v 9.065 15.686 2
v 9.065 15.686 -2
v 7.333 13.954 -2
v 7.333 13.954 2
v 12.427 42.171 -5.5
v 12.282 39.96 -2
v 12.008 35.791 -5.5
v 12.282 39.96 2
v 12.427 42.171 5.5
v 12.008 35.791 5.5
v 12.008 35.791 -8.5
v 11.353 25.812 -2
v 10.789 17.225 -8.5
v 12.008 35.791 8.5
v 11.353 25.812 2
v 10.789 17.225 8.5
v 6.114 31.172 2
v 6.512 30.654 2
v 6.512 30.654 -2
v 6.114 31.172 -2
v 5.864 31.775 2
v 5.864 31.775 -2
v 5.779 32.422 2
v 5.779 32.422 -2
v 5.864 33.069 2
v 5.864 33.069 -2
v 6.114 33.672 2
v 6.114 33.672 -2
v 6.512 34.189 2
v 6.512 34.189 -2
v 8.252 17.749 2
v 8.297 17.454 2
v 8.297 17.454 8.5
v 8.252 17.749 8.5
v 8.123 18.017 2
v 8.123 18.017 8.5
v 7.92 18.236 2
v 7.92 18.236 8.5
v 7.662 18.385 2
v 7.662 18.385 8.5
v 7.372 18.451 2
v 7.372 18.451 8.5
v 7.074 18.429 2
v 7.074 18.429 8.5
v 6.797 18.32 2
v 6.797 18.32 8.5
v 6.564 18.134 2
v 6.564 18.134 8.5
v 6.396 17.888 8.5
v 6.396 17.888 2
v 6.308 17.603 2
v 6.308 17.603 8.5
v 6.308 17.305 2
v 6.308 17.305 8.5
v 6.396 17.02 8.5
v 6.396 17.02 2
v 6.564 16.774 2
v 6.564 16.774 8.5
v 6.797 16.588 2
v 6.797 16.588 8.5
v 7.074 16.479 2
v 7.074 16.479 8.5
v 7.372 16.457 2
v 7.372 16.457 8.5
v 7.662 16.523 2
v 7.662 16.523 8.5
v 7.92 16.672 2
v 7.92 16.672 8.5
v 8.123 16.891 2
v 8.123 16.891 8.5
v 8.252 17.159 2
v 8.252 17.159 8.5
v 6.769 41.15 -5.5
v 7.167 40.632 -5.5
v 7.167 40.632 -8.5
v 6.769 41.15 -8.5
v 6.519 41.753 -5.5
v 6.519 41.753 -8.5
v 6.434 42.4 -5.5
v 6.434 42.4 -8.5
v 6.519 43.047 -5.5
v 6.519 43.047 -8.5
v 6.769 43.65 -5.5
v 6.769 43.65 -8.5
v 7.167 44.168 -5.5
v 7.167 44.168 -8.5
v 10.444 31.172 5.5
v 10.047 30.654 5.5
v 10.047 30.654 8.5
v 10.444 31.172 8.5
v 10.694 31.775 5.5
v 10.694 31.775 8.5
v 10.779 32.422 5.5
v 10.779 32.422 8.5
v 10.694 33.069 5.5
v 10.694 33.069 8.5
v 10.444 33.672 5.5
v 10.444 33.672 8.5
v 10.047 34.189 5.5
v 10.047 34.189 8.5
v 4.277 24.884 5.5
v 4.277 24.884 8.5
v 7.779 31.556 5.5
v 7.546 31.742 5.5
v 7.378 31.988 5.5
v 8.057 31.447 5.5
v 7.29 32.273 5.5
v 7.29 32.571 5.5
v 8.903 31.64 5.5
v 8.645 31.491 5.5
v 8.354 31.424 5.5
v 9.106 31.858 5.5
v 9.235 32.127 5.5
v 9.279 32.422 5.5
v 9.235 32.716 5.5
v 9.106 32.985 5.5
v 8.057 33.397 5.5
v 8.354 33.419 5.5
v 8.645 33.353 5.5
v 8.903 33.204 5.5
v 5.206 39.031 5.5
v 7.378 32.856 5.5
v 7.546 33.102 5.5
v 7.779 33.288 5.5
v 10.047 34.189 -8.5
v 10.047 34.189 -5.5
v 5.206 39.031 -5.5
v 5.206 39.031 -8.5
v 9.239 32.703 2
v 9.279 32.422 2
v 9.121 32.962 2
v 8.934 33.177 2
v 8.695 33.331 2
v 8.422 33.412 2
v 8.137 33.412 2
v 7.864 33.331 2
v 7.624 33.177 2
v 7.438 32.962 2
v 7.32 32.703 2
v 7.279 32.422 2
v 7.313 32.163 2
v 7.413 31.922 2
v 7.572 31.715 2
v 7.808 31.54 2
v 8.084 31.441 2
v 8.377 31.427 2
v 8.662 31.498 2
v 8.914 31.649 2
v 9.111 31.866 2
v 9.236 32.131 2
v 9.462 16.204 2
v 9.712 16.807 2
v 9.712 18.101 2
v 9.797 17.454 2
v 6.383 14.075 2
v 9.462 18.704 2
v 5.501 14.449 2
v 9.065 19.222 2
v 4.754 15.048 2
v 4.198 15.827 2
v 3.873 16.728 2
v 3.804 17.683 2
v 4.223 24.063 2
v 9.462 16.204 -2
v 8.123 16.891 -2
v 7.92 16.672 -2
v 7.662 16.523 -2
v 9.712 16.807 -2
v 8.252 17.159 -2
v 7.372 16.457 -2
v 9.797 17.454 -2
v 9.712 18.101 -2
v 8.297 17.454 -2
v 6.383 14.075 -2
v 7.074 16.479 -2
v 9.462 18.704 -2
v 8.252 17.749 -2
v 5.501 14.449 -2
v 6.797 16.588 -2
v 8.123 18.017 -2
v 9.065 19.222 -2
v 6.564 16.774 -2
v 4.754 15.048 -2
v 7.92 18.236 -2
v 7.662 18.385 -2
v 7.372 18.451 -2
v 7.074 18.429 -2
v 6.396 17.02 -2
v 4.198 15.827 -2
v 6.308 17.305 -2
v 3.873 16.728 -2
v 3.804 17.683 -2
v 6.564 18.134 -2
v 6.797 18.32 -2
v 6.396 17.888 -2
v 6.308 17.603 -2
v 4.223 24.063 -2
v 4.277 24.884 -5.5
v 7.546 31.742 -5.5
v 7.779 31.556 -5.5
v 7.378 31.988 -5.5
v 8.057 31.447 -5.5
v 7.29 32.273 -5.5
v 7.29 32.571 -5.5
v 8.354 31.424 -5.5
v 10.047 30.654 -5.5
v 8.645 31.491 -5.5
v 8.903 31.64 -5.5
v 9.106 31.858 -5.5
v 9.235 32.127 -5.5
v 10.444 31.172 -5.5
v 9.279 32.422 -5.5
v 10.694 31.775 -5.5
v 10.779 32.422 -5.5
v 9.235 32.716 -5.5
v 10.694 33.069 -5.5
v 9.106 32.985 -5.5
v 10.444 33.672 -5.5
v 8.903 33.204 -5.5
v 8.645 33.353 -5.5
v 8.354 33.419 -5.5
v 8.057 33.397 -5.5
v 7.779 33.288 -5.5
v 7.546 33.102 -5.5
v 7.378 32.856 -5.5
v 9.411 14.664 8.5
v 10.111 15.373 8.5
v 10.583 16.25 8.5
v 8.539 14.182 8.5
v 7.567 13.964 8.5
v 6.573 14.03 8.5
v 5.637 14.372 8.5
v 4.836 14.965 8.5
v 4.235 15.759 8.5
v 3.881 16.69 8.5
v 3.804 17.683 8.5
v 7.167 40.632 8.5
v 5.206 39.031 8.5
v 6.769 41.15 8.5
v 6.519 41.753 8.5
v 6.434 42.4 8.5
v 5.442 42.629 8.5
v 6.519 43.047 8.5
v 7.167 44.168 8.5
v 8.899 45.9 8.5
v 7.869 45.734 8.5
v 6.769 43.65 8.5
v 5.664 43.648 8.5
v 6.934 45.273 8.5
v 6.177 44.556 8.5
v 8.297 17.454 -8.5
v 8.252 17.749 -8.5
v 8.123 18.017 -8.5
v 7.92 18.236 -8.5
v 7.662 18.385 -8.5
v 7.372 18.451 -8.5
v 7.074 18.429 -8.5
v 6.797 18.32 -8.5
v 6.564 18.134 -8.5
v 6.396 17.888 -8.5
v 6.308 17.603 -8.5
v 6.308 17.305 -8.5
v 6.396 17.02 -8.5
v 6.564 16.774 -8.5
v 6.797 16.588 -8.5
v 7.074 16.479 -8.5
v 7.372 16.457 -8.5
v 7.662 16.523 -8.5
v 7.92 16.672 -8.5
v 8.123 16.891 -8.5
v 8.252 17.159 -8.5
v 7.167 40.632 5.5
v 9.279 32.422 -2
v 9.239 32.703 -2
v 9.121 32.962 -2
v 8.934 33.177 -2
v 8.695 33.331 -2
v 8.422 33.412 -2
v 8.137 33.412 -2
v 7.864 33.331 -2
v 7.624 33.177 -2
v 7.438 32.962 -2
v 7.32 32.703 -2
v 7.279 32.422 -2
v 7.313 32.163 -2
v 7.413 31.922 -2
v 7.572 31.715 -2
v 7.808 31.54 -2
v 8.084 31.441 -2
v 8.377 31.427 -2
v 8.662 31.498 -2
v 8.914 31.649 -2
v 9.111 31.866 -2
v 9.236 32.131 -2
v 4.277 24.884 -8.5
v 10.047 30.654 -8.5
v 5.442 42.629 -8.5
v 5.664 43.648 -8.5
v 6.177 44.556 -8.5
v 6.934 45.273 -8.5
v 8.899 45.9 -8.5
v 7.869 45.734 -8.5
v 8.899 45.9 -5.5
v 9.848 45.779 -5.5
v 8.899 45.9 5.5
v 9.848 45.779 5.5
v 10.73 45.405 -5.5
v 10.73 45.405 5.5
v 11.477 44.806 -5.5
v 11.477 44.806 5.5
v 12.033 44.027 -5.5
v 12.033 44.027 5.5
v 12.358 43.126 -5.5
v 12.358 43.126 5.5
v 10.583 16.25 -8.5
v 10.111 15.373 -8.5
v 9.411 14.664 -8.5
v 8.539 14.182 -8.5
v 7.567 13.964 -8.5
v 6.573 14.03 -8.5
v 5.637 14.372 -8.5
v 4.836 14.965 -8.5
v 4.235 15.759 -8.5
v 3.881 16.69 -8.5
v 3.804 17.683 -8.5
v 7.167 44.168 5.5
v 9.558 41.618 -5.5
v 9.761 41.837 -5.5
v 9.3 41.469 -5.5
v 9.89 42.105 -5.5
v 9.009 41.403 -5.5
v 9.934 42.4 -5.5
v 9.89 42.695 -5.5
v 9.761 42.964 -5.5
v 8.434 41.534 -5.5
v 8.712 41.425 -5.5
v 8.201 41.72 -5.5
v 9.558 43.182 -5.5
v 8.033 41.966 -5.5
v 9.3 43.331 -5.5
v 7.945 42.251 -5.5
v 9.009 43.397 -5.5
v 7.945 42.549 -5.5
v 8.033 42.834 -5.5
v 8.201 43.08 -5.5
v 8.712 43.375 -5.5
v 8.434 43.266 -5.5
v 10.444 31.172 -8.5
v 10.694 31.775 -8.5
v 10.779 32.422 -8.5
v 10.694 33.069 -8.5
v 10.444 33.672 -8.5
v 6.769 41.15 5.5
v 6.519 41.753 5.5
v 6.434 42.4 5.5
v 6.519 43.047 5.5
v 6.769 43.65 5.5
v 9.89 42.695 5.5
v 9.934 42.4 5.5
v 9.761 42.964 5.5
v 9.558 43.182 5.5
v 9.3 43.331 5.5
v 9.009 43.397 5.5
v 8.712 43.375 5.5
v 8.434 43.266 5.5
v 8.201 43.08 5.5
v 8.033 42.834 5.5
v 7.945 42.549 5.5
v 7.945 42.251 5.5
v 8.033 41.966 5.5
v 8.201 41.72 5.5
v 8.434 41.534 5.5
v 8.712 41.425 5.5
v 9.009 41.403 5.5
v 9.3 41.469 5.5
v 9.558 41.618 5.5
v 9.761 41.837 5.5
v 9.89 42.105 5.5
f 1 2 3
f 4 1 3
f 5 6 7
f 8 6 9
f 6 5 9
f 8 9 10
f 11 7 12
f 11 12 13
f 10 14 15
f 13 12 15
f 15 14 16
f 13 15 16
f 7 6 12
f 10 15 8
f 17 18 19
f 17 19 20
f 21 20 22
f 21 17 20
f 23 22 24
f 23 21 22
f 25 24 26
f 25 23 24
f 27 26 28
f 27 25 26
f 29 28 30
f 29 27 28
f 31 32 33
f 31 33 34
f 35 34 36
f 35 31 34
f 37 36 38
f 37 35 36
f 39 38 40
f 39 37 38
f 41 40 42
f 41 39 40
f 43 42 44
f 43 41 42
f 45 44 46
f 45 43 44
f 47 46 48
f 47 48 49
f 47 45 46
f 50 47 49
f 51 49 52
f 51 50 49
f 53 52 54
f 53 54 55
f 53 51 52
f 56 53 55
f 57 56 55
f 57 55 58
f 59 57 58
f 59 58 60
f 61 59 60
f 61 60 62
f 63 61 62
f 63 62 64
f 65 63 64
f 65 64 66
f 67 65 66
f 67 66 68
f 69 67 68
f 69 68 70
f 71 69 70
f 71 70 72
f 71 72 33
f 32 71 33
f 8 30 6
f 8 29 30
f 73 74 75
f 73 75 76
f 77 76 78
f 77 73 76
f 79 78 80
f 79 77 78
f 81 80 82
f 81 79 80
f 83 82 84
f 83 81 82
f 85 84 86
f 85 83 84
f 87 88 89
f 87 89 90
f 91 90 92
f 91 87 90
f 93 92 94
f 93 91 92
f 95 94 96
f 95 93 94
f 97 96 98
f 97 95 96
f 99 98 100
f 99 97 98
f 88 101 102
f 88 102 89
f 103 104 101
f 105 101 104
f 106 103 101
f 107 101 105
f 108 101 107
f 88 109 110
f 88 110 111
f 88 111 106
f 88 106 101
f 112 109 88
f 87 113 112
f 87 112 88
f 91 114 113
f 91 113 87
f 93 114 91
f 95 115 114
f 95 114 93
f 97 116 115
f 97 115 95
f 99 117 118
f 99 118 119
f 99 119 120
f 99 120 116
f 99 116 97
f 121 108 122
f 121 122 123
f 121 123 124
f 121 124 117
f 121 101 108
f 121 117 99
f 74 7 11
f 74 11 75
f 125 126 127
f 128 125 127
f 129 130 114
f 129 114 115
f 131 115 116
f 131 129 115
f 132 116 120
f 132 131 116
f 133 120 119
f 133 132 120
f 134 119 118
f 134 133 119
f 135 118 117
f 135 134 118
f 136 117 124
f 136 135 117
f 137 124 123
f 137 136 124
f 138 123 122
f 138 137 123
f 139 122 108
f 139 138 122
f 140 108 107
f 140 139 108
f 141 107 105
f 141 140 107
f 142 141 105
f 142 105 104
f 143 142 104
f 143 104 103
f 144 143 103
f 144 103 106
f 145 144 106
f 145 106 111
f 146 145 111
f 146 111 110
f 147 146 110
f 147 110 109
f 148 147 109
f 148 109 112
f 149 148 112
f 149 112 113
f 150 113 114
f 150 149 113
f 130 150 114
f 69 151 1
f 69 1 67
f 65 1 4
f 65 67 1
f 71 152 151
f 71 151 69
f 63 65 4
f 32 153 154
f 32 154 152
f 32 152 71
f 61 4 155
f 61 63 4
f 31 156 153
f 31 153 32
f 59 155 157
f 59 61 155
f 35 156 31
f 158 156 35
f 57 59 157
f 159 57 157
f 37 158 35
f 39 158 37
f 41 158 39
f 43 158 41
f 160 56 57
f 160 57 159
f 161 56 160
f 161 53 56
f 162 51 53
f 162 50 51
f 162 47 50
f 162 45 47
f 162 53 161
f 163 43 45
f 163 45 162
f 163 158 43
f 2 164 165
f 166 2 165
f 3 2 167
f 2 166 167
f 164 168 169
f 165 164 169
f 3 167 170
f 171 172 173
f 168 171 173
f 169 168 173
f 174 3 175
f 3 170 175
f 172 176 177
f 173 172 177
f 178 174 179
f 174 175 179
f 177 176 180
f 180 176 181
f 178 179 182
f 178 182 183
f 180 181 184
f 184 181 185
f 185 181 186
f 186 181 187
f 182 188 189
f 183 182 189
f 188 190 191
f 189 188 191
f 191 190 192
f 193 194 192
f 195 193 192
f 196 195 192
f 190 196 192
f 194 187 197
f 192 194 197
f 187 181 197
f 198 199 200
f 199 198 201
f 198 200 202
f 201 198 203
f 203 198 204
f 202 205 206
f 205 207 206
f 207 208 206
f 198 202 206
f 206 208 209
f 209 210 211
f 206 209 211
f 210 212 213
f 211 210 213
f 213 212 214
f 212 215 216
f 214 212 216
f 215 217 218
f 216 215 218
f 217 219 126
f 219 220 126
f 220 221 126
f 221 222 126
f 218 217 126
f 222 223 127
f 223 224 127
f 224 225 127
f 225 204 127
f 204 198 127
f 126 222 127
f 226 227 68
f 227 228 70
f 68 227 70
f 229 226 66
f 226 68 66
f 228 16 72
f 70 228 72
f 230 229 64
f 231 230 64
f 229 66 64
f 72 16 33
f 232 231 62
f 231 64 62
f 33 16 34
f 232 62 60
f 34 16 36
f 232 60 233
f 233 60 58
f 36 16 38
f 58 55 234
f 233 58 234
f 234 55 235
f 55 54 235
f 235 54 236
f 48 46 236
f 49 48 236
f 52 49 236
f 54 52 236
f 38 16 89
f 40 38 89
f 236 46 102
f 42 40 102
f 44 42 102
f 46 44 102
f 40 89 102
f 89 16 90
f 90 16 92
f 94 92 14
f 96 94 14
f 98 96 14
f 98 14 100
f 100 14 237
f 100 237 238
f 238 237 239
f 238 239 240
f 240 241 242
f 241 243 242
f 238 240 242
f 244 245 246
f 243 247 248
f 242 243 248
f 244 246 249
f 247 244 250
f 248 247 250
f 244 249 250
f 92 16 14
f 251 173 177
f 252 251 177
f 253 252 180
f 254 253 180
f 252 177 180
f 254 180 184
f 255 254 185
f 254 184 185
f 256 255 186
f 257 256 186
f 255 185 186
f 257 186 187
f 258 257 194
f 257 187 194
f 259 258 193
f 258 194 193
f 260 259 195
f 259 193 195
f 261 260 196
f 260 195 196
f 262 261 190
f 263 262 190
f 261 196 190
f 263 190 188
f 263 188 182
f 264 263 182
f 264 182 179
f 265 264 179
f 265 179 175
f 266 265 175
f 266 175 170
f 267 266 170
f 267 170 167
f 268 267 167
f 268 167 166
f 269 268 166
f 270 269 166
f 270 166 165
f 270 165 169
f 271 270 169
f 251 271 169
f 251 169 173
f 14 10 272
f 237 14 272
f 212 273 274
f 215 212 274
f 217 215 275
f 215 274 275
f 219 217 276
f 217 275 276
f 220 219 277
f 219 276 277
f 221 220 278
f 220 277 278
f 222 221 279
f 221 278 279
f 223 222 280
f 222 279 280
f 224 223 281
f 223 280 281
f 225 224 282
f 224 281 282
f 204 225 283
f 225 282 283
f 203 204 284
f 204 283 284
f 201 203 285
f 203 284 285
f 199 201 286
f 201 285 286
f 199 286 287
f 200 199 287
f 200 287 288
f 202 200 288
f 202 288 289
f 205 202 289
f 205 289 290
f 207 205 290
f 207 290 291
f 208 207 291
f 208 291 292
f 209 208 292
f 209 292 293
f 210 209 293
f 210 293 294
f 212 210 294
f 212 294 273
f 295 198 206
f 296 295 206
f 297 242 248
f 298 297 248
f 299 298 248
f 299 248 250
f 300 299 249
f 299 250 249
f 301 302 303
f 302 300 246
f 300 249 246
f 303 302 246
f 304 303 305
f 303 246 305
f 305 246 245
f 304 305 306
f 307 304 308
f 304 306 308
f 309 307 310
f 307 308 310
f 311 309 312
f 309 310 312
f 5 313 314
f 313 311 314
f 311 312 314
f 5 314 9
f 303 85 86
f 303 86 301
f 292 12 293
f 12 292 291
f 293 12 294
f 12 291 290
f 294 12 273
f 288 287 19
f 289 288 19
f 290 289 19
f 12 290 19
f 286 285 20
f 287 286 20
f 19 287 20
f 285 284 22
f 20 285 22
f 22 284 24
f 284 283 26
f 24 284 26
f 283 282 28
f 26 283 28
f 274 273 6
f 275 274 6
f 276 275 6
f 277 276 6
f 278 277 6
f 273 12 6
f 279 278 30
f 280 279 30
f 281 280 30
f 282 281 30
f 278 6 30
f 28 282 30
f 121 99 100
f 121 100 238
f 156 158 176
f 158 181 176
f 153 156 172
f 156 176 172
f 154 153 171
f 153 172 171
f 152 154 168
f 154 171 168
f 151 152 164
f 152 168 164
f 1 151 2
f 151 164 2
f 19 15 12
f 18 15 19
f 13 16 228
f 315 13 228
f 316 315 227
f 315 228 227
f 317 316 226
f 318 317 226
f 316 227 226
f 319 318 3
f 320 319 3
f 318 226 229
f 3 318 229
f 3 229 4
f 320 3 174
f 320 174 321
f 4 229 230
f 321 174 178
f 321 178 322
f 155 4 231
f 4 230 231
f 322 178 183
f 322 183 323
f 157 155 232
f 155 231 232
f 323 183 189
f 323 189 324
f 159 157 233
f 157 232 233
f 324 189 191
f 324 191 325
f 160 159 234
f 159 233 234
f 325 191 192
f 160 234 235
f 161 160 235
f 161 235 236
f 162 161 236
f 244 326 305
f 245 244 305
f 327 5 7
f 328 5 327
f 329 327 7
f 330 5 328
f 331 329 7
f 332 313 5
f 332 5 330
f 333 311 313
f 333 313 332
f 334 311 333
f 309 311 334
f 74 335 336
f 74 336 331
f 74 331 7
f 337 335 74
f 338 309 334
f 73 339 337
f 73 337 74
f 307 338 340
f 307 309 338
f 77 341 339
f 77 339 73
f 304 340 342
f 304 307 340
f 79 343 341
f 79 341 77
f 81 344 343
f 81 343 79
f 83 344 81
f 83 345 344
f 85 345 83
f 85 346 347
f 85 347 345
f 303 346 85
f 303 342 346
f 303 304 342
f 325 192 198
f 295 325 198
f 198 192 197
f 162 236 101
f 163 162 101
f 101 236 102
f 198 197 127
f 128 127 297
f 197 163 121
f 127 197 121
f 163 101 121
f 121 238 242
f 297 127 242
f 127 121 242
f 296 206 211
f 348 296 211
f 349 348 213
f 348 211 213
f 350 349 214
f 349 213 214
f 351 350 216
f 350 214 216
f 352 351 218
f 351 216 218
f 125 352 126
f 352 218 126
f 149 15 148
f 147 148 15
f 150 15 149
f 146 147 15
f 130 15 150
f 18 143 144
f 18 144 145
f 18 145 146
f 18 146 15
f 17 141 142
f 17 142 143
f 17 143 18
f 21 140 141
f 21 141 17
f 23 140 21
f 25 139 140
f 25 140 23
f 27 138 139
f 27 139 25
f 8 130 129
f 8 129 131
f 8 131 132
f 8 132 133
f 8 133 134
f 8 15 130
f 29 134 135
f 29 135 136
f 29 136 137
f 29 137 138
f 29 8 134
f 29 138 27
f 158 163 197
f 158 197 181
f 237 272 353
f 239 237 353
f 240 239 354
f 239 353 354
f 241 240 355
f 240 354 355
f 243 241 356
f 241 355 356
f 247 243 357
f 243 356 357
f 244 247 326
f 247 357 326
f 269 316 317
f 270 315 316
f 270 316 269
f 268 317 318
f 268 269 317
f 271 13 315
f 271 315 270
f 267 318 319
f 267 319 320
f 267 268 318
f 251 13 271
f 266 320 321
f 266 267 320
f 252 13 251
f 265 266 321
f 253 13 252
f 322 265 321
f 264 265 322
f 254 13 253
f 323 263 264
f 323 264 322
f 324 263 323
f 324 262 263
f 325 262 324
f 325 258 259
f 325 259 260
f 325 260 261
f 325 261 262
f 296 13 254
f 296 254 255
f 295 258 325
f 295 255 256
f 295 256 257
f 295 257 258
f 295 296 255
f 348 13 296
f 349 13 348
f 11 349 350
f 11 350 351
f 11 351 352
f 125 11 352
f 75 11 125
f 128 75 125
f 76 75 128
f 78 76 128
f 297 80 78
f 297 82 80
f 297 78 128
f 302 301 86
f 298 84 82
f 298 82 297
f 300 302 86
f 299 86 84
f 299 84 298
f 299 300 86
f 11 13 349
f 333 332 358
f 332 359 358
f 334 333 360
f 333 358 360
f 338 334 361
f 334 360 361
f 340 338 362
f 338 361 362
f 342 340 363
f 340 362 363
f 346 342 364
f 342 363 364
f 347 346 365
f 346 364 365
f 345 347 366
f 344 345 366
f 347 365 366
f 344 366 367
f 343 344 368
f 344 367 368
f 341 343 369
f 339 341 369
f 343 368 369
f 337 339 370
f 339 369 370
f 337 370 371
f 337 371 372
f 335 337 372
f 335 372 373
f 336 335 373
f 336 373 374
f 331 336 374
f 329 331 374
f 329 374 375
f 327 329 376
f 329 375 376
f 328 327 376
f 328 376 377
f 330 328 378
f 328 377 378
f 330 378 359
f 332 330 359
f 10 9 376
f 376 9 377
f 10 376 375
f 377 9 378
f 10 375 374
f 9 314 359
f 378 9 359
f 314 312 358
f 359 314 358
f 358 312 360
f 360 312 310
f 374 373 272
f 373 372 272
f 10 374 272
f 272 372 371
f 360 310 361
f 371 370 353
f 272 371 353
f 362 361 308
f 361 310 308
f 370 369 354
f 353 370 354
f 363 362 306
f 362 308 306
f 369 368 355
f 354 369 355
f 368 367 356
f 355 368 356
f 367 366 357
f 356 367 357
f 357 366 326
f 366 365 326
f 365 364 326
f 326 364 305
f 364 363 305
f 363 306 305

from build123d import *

# Parameters (mm, degrees)
SKETCH1_R           = 1
BOSS_EXTRUDE1_DEPTH = 8.5
CUT_EXTRUDE1_DEPTH  = 2
CUT_EXTRUDE2_START  = -3
CUT_EXTRUDE2_DEPTH  = 3


with BuildPart() as part:
    # Sketch1 → Boss-Extrude1 (new body)
    with BuildSketch(Plane.XY):
        with BuildLine():
            Line((12.42679356, 42.170979879), (10.789298219, 17.224665341))
            ThreePointArc((10.789298219, 17.224665341), (7.067564836, 13.961430653), (3.804330148, 17.683164036))
            Line((3.804330148, 17.683164036), (5.441825489, 42.629478574))
            ThreePointArc((5.441825489, 42.629478574), (9.163558872, 45.892713262), (12.42679356, 42.170979879))
        make_face()
        with Locations((7.296814184, 17.453914689)):
            Circle(SKETCH1_R, mode=Mode.SUBTRACT)
        with Locations((8.279311388, 32.421703411)):
            Circle(SKETCH1_R, mode=Mode.SUBTRACT)
        with Locations((8.934309525, 42.400229226)):
            Circle(SKETCH1_R, mode=Mode.SUBTRACT)
    boss_extrude1 = extrude(amount=BOSS_EXTRUDE1_DEPTH)

    # Sketch2 → Cut-Extrude1 (cut)
    # profile 1 of 2: a face of its own
    with BuildSketch(Plane(origin=(0, 0, 0), x_dir=(-1, 0, 0), z_dir=(0, 0, -1))):
        with BuildLine():
            ThreePointArc((-6.511544435, 30.653936458), (-5.779311388, 32.421703411), (-6.511544435, 34.189470364))
            Line((-6.511544435, 34.189470364), (-12.281634265, 39.959560194))
            Line((-12.281634265, 39.959560194), (-11.353008502, 25.812472391))
            Line((-11.353008502, 25.812472391), (-6.511544435, 30.653936458))
        make_face()
        with BuildLine():
            ThreePointArc((-7.279311388, 32.421703411), (-7.355431856, 32.039019979), (-7.572204607, 31.71459663))
            ThreePointArc((-7.572204607, 31.71459663), (-9.203190921, 32.804386844), (-7.279311388, 32.421703411))
        make_face(mode=Mode.SUBTRACT)
    # profile 2 of 2: a face of its own
    with BuildSketch(Plane(origin=(0, 0, 0), x_dir=(-1, 0, 0), z_dir=(0, 0, -1))):
        with BuildLine():
            ThreePointArc((-9.064581137, 19.221681642), (-9.796814184, 17.453914689), (-9.064581137, 15.686147736))
            Line((-9.064581137, 15.686147736), (-3.30921397, 9.930780569))
            Line((-3.30921397, 9.930780569), (-3.30921397, 24.977048808))
            Line((-3.30921397, 24.977048808), (-9.064581137, 19.221681642))
        make_face()
    cut_extrude1 = extrude(amount=-CUT_EXTRUDE1_DEPTH, mode=Mode.SUBTRACT)

    # Sketch3 → Cut-Extrude2 (cut)
    with BuildSketch(Plane.XY.offset(8.5).offset(CUT_EXTRUDE2_START)):
        with BuildLine():
            Line((7.166542572, 44.167996179), (14.185239134, 51.186692741))
            Line((14.185239134, 51.186692741), (14.789130122, 33.009874723))
            Line((14.789130122, 33.009874723), (7.166542572, 40.632462273))
            ThreePointArc((7.166542572, 40.632462273), (6.434309525, 42.400229226), (7.166542572, 44.167996179))
        make_face()
        with BuildLine():
            Line((10.047078341, 34.189470364), (4.005126991, 40.231421715))
            Line((4.005126991, 40.231421715), (3.260559385, 23.867417502))
            Line((3.260559385, 23.867417502), (10.047078341, 30.653936458))
            ThreePointArc((10.047078341, 30.653936458), (10.779311388, 32.421703411), (10.047078341, 34.189470364))
        make_face()
    cut_extrude2 = extrude(amount=CUT_EXTRUDE2_DEPTH, mode=Mode.SUBTRACT)

    # Mirror1: Boss-Extrude1, Cut-Extrude1, Cut-Extrude2 across plane
    add(boss_extrude1.mirror(Plane(origin=(0, 0, 0), x_dir=(1, 0, 0), z_dir=(0, 0, -1))))
    add(cut_extrude1.mirror(Plane(origin=(0, 0, 0), x_dir=(1, 0, 0), z_dir=(0, 0, -1))), mode=Mode.SUBTRACT)
    add(cut_extrude2.mirror(Plane(origin=(0, 0, 0), x_dir=(1, 0, 0), z_dir=(0, 0, -1))), mode=Mode.SUBTRACT)


solid = part.part
